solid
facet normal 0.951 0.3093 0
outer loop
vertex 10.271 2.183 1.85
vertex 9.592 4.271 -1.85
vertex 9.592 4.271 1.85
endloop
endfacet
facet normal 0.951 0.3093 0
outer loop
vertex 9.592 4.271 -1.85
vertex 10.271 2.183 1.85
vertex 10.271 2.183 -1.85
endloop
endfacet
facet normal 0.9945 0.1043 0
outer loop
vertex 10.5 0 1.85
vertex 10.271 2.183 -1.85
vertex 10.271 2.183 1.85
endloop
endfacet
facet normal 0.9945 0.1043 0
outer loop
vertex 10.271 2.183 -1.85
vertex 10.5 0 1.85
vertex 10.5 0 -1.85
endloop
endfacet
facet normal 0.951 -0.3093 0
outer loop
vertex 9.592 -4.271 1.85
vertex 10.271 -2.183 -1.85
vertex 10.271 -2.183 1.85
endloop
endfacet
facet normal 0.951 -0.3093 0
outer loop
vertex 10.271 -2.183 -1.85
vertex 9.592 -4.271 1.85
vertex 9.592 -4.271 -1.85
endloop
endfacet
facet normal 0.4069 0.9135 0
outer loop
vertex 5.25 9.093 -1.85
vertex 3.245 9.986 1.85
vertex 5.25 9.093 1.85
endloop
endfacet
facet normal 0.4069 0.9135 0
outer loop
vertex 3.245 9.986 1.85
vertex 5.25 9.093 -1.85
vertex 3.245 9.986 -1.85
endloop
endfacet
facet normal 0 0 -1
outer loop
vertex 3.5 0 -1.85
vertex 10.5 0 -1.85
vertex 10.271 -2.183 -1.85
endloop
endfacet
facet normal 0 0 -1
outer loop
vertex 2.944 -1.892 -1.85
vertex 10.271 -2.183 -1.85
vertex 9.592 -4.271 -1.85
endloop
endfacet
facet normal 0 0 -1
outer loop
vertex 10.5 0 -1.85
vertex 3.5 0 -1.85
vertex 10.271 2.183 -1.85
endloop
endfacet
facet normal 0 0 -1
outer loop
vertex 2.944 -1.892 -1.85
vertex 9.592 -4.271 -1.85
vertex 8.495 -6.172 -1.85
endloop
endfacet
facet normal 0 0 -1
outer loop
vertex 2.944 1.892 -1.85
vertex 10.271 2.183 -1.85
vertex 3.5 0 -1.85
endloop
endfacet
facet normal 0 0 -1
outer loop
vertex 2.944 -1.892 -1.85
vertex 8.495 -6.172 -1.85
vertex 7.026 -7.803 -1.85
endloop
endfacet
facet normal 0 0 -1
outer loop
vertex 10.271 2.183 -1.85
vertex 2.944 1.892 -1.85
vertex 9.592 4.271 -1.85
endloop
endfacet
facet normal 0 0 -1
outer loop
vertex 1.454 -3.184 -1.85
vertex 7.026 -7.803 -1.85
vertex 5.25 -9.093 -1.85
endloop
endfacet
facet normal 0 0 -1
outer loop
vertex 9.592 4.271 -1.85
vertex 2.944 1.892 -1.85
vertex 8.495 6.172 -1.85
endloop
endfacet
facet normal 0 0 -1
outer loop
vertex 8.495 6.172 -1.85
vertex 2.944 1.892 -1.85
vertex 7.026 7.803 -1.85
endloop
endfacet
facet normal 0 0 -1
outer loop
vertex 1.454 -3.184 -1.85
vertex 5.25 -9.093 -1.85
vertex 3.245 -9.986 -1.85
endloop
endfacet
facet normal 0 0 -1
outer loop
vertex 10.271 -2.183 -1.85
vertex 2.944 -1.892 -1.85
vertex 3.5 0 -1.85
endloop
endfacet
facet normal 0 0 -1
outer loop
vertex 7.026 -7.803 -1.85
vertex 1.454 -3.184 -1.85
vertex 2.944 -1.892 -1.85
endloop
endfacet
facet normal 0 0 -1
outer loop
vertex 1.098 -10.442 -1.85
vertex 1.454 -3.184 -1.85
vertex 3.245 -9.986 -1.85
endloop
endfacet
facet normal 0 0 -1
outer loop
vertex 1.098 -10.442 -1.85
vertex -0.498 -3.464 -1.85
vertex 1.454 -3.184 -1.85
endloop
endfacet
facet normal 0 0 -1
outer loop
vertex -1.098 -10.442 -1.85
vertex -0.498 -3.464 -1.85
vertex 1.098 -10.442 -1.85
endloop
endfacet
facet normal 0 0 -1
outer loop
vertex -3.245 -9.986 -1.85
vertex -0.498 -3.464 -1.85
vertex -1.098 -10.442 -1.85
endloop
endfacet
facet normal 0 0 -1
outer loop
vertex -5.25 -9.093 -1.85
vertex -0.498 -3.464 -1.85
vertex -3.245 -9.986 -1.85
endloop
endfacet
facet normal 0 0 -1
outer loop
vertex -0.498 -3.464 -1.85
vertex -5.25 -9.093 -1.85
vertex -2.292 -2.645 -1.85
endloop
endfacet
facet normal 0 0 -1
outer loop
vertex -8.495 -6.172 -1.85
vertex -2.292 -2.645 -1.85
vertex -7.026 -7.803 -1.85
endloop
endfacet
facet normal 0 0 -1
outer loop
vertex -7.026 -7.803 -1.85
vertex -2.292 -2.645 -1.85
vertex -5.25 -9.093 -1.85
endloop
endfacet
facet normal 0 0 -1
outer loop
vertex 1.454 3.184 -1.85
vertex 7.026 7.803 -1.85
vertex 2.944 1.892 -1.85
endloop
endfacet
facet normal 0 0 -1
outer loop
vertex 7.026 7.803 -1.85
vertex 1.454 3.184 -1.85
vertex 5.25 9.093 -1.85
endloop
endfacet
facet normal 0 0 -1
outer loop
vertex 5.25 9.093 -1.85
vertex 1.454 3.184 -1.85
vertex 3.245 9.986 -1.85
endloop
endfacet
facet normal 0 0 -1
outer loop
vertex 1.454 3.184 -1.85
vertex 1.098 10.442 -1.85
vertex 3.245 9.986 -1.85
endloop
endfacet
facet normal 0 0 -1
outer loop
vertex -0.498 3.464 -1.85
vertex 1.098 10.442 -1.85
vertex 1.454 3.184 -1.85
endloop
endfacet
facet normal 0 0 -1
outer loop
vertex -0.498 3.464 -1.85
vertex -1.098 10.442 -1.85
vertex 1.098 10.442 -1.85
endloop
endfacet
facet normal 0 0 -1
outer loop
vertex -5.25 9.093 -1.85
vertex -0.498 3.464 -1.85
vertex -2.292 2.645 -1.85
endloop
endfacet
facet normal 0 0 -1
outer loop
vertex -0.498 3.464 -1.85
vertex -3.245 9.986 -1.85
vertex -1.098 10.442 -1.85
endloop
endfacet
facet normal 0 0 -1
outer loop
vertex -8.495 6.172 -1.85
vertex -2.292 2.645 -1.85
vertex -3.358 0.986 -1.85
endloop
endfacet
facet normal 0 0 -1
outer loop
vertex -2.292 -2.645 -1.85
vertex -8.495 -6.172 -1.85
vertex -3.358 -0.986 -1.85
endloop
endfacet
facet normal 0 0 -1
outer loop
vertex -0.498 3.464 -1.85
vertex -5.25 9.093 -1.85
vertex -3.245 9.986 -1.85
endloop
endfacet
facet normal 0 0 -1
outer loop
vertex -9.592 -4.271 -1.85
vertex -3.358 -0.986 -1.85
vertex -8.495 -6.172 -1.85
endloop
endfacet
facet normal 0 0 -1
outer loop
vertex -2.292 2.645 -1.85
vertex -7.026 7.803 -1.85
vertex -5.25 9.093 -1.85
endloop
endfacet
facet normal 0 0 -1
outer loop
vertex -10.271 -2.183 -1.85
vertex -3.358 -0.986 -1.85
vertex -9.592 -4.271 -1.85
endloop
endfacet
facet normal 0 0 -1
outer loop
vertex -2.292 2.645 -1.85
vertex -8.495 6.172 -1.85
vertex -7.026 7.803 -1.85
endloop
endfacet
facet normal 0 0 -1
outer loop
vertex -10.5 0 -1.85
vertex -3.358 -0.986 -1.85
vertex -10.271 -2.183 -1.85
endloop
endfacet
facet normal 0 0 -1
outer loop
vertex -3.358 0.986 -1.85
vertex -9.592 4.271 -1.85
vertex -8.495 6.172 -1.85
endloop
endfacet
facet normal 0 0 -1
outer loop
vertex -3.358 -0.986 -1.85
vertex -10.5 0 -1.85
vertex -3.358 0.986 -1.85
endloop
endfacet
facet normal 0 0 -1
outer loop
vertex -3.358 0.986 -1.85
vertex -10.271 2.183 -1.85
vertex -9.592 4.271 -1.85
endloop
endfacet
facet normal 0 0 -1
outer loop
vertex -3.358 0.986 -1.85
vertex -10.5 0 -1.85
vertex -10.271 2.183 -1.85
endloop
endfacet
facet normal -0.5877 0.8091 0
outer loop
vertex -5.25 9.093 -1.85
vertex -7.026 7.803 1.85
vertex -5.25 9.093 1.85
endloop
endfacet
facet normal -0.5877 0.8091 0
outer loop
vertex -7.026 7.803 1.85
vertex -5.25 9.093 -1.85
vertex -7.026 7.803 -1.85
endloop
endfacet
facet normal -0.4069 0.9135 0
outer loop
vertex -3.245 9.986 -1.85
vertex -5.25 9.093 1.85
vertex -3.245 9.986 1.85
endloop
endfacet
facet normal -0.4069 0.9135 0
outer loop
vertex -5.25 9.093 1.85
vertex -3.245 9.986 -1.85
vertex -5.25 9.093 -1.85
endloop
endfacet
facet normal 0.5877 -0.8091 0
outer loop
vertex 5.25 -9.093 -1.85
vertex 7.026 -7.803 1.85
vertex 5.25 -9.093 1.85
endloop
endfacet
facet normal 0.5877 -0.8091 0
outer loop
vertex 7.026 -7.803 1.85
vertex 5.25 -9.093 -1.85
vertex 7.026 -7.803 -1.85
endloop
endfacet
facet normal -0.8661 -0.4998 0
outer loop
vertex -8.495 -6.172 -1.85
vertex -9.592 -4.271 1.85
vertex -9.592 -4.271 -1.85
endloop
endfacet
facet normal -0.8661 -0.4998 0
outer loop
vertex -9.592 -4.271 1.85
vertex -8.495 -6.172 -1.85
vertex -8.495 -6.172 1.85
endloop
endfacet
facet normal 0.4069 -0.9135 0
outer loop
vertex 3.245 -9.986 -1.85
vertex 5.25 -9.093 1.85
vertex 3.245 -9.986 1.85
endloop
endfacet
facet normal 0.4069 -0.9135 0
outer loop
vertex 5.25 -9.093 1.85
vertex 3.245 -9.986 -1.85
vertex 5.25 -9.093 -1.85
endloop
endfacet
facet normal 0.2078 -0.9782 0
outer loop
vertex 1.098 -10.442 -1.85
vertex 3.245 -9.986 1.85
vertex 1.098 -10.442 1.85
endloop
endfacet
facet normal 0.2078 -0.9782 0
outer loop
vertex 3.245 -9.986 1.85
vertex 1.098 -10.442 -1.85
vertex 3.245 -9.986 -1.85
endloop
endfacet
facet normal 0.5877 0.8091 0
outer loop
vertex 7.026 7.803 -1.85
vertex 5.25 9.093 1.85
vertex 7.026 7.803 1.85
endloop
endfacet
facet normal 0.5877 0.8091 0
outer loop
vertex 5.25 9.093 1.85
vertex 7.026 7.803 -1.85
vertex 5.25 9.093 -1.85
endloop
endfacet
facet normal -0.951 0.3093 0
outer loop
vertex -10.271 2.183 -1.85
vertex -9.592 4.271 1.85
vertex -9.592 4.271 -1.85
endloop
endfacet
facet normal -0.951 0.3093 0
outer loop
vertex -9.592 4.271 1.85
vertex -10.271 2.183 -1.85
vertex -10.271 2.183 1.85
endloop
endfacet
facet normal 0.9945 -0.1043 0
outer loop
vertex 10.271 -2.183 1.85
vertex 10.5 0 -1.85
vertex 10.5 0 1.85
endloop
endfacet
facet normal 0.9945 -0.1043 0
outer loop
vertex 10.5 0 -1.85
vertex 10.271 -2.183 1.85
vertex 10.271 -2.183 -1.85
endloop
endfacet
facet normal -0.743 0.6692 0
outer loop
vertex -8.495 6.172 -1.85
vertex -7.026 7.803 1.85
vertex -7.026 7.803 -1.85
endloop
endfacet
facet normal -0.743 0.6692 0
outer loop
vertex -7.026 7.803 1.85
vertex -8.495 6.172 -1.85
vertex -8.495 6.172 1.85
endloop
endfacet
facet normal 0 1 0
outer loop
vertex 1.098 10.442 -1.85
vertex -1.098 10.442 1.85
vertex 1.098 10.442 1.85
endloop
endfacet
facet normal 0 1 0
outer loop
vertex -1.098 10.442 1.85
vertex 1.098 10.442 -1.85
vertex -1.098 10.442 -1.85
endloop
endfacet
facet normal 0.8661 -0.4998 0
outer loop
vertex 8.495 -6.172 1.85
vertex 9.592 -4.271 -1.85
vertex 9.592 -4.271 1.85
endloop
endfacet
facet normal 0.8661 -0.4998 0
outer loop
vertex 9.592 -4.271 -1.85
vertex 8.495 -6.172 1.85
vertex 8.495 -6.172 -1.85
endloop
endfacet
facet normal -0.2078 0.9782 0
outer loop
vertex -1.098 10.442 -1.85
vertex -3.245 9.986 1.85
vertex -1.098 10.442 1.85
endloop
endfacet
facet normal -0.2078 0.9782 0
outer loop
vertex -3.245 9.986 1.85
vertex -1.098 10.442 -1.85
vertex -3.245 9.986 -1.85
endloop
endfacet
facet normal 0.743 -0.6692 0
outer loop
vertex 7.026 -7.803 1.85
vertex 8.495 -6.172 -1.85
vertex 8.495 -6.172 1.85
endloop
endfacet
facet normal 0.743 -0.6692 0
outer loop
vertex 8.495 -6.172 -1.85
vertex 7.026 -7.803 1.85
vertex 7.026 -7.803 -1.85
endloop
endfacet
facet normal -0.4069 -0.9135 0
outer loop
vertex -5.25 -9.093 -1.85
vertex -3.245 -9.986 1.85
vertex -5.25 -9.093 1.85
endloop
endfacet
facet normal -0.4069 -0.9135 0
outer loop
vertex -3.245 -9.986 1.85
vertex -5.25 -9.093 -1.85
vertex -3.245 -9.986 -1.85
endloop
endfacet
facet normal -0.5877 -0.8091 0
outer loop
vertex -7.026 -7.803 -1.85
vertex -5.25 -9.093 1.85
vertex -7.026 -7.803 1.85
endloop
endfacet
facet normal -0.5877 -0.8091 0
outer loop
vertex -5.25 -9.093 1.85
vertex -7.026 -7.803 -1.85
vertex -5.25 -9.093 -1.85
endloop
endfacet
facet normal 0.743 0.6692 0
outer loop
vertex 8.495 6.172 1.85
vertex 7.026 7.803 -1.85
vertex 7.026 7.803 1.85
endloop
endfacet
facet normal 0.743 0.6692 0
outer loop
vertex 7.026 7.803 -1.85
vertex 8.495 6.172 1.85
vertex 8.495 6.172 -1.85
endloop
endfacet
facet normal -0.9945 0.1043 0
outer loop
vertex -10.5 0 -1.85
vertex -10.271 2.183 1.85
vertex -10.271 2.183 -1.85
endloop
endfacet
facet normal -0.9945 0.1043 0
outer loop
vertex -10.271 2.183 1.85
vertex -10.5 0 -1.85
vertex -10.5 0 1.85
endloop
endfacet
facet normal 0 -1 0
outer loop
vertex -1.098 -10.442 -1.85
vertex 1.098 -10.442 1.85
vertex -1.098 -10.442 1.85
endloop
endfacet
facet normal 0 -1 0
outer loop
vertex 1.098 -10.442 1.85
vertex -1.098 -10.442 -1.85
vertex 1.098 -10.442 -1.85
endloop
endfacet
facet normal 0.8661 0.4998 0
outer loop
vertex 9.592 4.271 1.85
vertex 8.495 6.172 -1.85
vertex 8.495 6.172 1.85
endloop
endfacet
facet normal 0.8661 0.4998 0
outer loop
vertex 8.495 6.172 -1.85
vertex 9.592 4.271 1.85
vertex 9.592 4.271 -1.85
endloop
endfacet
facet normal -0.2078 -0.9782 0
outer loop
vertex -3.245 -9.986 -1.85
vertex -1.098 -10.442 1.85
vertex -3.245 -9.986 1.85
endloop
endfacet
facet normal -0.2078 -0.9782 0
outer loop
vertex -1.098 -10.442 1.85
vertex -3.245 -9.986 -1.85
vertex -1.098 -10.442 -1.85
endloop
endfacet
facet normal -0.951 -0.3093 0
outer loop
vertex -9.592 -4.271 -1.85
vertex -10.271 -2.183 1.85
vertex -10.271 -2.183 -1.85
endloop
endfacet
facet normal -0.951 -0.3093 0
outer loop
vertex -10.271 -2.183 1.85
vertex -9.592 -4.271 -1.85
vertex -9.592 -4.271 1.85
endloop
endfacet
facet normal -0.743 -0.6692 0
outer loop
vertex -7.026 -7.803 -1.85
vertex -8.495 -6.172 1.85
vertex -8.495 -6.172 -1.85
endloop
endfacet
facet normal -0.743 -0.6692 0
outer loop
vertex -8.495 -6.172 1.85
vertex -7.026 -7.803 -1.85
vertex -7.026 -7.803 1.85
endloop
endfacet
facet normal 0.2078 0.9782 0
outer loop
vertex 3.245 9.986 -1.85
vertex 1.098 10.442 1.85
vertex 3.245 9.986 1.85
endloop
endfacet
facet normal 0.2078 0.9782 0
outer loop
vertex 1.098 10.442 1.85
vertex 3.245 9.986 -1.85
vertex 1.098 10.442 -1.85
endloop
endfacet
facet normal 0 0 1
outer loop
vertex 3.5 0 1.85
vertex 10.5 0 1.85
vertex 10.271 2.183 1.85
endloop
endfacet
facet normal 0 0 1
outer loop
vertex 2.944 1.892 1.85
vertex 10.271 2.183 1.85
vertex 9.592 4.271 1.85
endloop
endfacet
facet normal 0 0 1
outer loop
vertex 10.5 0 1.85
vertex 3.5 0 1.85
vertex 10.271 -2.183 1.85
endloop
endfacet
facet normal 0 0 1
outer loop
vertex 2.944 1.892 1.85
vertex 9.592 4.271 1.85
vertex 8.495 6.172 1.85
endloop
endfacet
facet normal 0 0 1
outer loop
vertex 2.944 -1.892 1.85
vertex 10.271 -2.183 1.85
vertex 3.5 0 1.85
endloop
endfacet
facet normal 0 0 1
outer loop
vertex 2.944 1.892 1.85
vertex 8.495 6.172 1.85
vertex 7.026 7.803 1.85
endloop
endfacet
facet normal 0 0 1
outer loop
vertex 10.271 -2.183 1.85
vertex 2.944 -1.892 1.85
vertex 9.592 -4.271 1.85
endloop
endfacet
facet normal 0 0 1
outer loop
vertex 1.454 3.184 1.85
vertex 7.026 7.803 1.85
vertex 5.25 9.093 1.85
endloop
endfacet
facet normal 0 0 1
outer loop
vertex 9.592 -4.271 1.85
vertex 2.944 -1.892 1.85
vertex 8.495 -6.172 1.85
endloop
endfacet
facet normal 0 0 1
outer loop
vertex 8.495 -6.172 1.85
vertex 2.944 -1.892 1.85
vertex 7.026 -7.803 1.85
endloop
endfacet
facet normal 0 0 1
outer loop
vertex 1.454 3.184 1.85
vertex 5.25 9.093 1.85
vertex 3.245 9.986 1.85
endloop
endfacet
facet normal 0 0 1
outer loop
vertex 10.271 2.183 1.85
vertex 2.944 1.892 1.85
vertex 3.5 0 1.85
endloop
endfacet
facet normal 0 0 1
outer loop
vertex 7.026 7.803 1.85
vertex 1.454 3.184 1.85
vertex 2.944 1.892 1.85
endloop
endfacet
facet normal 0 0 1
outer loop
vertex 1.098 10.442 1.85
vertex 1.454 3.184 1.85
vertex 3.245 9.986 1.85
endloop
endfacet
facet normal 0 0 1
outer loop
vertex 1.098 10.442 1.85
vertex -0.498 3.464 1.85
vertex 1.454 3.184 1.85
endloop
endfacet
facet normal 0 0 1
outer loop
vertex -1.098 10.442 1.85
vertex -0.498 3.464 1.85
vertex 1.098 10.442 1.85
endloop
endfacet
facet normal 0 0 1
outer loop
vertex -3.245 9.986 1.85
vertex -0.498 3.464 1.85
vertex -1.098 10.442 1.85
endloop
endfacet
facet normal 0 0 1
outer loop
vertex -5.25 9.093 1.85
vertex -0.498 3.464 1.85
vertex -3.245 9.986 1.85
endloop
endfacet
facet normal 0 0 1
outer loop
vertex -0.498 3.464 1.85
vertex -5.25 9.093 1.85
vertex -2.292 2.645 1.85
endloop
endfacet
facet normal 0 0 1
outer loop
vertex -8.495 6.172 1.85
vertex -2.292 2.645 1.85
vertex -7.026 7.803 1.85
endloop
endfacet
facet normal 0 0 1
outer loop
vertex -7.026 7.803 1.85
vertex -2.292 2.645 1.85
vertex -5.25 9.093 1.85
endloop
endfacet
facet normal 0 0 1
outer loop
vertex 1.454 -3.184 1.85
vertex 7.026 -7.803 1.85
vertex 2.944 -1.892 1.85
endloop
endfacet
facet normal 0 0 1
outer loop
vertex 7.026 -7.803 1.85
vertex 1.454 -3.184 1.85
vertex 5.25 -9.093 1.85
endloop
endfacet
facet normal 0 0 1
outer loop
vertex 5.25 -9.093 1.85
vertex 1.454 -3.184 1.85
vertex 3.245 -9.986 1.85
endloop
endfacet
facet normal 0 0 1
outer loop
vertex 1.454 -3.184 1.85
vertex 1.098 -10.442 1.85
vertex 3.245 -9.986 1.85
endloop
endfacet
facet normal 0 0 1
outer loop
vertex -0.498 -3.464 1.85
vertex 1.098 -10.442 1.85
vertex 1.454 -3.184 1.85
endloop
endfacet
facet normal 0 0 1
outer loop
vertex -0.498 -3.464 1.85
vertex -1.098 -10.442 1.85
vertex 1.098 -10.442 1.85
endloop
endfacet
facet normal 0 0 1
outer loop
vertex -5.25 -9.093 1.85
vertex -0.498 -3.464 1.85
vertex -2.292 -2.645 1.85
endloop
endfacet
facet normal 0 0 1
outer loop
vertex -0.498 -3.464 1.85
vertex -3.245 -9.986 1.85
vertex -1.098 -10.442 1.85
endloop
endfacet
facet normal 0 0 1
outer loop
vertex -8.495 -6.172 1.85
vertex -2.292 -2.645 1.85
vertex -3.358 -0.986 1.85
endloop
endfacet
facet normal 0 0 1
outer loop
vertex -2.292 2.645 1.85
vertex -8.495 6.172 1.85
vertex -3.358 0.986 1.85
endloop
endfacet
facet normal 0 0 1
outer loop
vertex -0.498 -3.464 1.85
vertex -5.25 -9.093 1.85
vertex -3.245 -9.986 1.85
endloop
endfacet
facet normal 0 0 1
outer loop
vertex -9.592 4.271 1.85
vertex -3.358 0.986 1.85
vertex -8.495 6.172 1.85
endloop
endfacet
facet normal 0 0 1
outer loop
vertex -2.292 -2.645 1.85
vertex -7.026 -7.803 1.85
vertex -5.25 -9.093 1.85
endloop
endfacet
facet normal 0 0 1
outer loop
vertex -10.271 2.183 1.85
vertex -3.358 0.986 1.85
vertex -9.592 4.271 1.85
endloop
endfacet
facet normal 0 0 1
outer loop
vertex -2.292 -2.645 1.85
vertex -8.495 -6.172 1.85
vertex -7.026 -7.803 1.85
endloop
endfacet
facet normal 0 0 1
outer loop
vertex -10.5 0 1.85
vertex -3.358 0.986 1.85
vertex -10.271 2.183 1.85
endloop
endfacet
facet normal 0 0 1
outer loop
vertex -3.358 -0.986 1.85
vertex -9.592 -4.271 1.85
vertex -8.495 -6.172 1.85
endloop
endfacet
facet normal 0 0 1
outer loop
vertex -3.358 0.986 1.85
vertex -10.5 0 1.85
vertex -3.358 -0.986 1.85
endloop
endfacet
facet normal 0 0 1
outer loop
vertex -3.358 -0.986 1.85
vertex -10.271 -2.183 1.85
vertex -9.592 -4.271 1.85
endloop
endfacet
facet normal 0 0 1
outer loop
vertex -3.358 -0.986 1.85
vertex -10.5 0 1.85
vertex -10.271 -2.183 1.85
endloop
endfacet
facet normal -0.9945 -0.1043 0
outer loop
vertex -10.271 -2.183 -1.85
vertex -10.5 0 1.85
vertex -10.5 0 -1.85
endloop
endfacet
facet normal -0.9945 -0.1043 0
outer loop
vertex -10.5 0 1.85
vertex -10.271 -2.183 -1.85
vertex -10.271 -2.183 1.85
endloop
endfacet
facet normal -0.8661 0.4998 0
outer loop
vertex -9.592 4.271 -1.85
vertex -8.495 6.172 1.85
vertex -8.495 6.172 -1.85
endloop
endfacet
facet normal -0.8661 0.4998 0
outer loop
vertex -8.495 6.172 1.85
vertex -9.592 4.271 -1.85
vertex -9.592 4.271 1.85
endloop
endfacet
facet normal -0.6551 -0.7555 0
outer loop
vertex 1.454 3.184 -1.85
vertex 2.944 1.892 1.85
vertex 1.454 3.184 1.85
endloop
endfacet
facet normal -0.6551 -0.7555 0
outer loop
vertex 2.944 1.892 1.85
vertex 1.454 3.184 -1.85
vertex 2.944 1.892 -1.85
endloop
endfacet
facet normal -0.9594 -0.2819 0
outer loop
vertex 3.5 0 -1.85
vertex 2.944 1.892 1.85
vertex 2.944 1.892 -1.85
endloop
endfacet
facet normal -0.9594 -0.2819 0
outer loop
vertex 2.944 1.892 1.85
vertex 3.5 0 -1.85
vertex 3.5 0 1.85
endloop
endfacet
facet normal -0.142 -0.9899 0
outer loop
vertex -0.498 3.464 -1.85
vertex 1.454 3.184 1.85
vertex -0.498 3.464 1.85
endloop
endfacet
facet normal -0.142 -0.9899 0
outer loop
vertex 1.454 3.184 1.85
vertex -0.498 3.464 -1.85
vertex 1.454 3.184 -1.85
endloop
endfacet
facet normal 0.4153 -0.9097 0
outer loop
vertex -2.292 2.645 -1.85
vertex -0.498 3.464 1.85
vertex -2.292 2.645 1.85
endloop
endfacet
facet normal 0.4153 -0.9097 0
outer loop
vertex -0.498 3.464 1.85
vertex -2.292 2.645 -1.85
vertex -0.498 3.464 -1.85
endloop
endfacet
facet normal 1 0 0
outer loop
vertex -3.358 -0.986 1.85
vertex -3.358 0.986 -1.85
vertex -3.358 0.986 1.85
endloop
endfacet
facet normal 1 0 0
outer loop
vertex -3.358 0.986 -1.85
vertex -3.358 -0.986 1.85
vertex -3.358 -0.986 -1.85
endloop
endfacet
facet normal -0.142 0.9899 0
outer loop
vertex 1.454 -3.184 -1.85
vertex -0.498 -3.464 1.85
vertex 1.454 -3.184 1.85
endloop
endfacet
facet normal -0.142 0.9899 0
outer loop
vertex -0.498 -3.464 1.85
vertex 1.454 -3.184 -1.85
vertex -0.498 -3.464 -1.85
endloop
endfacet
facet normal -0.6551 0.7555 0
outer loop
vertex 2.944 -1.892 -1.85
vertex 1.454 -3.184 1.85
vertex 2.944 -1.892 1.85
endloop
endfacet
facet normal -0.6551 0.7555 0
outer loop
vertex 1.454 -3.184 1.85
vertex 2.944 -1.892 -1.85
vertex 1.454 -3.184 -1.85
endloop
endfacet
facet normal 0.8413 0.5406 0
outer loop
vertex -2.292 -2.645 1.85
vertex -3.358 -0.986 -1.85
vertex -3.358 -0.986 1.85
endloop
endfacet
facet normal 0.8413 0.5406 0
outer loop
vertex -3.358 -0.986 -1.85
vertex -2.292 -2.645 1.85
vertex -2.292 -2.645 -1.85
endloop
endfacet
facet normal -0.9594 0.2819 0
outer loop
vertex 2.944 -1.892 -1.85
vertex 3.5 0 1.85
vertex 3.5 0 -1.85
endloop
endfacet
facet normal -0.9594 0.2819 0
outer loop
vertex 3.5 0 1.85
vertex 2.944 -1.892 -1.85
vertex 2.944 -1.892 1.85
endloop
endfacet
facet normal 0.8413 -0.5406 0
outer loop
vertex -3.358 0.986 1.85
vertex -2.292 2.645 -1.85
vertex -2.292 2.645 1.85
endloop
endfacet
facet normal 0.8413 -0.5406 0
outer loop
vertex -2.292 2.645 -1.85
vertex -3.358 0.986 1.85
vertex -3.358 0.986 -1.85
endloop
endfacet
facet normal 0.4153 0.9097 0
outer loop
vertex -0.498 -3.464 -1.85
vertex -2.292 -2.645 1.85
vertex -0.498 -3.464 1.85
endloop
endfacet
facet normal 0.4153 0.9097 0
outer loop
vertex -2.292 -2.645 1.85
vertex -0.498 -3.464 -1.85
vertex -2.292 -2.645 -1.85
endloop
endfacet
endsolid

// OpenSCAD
// Parameters
outer_radius = 10.5; //[5.25:21:0.1]
inner_radius = 3.5; //[1.75:7:0.1]
height = 3.7; //[1.85:7.4:0.1]

// Geometry
module radial_body_outer() {
  cylinder(h=height, r=outer_radius, center=true);
}

module radial_body_inner_void() {
  cylinder(h=height, r=inner_radius, center=true);
}

// Final Output
difference() {
  radial_body_outer();
  radial_body_inner_void();
}
